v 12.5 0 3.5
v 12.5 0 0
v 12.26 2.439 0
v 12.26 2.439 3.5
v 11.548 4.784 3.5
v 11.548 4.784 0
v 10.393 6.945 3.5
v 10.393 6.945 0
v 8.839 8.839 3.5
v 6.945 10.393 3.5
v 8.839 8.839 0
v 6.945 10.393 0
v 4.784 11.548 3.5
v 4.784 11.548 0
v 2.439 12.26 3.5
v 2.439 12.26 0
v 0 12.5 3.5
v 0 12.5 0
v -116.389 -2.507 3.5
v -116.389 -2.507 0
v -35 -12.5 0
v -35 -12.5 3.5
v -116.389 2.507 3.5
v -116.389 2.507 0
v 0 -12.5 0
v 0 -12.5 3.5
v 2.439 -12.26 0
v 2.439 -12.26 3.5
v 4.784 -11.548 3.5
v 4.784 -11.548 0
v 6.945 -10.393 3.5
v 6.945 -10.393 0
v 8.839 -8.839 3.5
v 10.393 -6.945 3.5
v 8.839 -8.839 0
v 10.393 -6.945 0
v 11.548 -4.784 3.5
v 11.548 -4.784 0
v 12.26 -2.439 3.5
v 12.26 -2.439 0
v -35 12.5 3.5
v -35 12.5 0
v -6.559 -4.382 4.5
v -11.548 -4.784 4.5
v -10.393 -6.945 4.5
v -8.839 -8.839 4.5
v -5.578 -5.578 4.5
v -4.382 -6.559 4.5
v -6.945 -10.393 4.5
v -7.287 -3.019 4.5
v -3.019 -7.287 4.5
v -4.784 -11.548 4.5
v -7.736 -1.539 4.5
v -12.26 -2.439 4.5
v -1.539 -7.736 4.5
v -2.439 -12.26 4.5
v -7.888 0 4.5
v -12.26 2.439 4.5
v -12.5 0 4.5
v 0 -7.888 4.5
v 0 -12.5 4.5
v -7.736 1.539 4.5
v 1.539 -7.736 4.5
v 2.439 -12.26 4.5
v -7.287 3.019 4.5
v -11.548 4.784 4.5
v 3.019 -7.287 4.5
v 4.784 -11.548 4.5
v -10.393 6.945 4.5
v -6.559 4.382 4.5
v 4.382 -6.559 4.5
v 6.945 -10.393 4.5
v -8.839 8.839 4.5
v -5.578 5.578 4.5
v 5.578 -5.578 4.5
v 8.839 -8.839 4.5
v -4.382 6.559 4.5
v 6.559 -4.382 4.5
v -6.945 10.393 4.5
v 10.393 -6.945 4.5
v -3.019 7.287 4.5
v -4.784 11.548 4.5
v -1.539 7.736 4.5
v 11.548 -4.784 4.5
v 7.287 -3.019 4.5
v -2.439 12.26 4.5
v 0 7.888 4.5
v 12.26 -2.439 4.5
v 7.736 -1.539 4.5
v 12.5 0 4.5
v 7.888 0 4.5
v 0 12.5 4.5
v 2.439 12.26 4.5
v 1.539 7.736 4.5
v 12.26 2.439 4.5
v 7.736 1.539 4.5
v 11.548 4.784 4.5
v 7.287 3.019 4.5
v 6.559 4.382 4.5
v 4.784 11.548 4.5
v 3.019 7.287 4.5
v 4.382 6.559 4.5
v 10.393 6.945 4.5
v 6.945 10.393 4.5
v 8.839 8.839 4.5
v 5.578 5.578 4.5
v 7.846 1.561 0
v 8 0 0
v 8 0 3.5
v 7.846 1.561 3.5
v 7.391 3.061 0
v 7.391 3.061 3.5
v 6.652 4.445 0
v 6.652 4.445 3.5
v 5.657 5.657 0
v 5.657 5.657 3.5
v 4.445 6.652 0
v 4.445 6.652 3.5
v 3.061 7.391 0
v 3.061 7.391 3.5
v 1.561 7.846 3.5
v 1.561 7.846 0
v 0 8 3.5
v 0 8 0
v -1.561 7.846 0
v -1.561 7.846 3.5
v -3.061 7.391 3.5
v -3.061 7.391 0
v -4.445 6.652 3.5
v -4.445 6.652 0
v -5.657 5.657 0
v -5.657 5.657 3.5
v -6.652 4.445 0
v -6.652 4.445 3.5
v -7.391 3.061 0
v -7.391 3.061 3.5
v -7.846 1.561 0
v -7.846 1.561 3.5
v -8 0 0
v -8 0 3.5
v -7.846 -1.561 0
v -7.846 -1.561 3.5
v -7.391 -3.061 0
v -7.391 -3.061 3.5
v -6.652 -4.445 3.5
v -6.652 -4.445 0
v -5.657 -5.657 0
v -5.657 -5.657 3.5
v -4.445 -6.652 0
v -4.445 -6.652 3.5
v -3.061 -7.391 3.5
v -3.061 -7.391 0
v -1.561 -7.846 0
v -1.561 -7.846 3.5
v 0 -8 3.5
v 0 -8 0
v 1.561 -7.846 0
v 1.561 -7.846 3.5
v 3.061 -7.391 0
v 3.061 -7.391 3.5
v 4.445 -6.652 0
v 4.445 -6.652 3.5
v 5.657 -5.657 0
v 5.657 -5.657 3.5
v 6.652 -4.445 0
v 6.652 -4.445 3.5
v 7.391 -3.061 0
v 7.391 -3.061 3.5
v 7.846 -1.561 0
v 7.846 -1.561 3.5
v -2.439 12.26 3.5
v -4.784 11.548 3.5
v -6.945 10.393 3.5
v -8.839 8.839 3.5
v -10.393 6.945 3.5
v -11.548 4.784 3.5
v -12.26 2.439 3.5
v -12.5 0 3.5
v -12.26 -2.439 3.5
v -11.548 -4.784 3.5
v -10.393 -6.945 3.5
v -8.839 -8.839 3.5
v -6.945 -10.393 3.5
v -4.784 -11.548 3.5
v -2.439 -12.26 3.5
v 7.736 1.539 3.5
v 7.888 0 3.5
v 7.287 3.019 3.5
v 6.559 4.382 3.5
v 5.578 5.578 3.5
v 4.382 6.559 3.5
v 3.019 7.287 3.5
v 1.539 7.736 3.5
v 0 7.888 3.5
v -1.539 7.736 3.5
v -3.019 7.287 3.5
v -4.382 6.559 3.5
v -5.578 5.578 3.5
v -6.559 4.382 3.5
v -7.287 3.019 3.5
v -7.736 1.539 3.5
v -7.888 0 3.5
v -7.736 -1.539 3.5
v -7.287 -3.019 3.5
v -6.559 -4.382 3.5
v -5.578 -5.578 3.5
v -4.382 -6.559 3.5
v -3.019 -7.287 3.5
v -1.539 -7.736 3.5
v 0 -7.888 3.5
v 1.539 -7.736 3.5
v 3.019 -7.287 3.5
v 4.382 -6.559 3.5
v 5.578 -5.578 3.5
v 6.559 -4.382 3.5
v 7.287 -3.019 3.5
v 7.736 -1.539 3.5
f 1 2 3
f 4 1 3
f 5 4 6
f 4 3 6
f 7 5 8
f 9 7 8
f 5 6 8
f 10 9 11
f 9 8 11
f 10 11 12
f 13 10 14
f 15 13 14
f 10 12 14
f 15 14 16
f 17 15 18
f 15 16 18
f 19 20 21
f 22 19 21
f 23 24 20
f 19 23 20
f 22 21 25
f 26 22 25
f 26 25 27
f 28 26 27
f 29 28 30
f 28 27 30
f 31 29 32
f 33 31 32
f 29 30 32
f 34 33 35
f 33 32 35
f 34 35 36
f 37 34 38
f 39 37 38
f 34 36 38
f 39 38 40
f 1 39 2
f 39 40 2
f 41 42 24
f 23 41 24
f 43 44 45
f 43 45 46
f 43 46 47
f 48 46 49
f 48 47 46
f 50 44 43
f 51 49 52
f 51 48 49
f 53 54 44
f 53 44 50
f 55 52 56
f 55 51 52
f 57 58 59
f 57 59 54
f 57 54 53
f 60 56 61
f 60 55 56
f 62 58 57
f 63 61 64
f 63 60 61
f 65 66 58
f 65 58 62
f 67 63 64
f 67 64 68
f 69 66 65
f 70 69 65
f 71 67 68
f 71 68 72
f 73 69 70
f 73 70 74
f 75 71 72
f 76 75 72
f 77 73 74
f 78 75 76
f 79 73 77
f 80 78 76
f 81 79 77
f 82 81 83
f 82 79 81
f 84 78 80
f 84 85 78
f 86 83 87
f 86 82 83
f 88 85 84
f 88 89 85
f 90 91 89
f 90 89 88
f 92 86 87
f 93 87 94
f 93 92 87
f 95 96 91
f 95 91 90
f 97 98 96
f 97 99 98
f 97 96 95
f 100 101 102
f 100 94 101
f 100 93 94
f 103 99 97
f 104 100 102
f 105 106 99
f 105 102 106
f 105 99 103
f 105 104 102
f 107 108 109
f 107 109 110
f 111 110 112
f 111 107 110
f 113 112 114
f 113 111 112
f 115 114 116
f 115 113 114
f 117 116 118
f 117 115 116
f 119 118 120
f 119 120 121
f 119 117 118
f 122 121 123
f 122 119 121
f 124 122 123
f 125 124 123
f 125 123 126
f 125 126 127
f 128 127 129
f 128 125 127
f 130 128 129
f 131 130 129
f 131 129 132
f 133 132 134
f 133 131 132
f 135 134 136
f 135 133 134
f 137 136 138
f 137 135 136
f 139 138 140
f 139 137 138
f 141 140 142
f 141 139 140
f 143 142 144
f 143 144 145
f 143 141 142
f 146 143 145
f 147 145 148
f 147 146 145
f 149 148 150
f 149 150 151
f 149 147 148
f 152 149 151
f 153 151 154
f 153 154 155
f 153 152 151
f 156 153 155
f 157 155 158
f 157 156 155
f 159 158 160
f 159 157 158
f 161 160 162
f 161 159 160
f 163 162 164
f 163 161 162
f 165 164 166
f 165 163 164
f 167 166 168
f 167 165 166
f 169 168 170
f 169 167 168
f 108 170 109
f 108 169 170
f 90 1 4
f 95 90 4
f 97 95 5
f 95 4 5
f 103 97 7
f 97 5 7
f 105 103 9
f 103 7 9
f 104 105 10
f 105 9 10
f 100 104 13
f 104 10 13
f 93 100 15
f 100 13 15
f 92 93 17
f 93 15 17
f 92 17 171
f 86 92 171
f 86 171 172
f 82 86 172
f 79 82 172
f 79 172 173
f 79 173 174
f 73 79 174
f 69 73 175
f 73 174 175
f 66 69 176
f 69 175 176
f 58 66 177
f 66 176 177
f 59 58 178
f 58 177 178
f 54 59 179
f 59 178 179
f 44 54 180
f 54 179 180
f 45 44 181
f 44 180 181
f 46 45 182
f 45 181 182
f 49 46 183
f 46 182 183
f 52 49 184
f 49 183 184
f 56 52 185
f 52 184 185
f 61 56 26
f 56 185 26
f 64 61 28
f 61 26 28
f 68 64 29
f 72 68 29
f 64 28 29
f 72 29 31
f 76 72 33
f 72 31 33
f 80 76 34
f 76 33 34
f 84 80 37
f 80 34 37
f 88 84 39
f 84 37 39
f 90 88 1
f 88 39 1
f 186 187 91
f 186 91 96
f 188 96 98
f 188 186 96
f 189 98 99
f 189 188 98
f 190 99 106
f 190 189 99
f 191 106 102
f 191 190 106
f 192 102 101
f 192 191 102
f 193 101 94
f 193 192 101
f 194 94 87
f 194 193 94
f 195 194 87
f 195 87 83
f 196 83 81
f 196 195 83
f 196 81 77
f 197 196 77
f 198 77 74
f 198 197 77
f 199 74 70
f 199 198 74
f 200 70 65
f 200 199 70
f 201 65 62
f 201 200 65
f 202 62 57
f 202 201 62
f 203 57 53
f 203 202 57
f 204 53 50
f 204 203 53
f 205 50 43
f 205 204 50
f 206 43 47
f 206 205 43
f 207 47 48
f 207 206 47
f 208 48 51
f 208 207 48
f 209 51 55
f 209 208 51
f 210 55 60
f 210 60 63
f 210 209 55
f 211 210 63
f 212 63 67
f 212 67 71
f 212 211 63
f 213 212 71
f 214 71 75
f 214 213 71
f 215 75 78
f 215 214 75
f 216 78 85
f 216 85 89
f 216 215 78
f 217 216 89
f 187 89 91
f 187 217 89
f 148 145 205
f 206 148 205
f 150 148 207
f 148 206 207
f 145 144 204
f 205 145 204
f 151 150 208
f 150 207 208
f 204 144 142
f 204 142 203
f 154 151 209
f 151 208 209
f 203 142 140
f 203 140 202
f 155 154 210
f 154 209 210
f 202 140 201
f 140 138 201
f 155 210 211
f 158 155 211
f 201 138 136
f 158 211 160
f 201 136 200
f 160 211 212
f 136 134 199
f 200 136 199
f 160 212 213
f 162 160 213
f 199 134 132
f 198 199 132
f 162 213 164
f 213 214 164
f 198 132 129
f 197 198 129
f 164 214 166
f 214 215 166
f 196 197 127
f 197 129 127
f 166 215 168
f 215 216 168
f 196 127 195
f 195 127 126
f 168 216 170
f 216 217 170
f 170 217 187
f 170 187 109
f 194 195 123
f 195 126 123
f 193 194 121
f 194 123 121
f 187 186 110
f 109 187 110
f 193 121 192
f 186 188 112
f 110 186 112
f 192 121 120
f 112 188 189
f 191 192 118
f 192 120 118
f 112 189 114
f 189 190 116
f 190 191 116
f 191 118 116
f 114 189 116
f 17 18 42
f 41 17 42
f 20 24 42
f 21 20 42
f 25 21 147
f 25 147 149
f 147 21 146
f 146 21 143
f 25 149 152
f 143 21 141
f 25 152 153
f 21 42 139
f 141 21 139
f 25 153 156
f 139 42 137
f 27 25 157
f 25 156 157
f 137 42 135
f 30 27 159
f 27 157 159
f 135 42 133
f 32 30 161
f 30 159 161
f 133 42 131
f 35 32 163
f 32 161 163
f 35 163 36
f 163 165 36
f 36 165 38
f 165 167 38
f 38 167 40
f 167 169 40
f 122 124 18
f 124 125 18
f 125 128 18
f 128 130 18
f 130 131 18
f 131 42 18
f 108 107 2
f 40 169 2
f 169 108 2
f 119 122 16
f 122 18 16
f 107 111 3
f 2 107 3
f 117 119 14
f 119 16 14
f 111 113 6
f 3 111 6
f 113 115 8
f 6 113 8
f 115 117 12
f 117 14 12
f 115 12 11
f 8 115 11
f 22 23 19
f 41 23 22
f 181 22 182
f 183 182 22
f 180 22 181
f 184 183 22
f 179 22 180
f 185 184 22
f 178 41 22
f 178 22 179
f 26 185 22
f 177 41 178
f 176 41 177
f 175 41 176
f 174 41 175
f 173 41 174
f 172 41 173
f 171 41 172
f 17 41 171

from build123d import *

# Parameters (mm, degrees)
F0_R     = 8
F1_DEPTH = 3.5
F2_R     = 12.5
F2_R_2   = 7.887929
F3_DEPTH = 1


with BuildPart() as f1:
    # F0 (on Top) → F1 (new body)
    with BuildSketch(Plane.XY):
        with BuildLine():
            ThreePointArc((0, -12.5), (-12.5, 0), (0, 12.5))
            Line((0, 12.5), (-35, 12.5))
            Line((-35, 12.5), (-116.388784, 2.506714))
            Line((-116.388784, 2.506714), (-116.388784, -2.506714))
            Line((-116.388784, -2.506714), (-35, -12.5))
            Line((-35, -12.5), (0, -12.5))
        make_face()
        with BuildLine():
            ThreePointArc((0, -12.5), (8.838835, -8.838835), (12.5, 0))
            ThreePointArc((12.5, 0), (8.838835, 8.838835), (0, 12.5))
            ThreePointArc((0, 12.5), (-12.5, 0), (0, -12.5))
        make_face()
        Circle(F0_R, mode=Mode.SUBTRACT)
    extrude(amount=F1_DEPTH)

    # F2 (on face) → F3 (join)
    with BuildSketch(Plane.XY.offset(3.5)):
        Circle(F2_R)
        Circle(F2_R_2, mode=Mode.SUBTRACT)
    extrude(amount=F3_DEPTH)


solid = f1.part
